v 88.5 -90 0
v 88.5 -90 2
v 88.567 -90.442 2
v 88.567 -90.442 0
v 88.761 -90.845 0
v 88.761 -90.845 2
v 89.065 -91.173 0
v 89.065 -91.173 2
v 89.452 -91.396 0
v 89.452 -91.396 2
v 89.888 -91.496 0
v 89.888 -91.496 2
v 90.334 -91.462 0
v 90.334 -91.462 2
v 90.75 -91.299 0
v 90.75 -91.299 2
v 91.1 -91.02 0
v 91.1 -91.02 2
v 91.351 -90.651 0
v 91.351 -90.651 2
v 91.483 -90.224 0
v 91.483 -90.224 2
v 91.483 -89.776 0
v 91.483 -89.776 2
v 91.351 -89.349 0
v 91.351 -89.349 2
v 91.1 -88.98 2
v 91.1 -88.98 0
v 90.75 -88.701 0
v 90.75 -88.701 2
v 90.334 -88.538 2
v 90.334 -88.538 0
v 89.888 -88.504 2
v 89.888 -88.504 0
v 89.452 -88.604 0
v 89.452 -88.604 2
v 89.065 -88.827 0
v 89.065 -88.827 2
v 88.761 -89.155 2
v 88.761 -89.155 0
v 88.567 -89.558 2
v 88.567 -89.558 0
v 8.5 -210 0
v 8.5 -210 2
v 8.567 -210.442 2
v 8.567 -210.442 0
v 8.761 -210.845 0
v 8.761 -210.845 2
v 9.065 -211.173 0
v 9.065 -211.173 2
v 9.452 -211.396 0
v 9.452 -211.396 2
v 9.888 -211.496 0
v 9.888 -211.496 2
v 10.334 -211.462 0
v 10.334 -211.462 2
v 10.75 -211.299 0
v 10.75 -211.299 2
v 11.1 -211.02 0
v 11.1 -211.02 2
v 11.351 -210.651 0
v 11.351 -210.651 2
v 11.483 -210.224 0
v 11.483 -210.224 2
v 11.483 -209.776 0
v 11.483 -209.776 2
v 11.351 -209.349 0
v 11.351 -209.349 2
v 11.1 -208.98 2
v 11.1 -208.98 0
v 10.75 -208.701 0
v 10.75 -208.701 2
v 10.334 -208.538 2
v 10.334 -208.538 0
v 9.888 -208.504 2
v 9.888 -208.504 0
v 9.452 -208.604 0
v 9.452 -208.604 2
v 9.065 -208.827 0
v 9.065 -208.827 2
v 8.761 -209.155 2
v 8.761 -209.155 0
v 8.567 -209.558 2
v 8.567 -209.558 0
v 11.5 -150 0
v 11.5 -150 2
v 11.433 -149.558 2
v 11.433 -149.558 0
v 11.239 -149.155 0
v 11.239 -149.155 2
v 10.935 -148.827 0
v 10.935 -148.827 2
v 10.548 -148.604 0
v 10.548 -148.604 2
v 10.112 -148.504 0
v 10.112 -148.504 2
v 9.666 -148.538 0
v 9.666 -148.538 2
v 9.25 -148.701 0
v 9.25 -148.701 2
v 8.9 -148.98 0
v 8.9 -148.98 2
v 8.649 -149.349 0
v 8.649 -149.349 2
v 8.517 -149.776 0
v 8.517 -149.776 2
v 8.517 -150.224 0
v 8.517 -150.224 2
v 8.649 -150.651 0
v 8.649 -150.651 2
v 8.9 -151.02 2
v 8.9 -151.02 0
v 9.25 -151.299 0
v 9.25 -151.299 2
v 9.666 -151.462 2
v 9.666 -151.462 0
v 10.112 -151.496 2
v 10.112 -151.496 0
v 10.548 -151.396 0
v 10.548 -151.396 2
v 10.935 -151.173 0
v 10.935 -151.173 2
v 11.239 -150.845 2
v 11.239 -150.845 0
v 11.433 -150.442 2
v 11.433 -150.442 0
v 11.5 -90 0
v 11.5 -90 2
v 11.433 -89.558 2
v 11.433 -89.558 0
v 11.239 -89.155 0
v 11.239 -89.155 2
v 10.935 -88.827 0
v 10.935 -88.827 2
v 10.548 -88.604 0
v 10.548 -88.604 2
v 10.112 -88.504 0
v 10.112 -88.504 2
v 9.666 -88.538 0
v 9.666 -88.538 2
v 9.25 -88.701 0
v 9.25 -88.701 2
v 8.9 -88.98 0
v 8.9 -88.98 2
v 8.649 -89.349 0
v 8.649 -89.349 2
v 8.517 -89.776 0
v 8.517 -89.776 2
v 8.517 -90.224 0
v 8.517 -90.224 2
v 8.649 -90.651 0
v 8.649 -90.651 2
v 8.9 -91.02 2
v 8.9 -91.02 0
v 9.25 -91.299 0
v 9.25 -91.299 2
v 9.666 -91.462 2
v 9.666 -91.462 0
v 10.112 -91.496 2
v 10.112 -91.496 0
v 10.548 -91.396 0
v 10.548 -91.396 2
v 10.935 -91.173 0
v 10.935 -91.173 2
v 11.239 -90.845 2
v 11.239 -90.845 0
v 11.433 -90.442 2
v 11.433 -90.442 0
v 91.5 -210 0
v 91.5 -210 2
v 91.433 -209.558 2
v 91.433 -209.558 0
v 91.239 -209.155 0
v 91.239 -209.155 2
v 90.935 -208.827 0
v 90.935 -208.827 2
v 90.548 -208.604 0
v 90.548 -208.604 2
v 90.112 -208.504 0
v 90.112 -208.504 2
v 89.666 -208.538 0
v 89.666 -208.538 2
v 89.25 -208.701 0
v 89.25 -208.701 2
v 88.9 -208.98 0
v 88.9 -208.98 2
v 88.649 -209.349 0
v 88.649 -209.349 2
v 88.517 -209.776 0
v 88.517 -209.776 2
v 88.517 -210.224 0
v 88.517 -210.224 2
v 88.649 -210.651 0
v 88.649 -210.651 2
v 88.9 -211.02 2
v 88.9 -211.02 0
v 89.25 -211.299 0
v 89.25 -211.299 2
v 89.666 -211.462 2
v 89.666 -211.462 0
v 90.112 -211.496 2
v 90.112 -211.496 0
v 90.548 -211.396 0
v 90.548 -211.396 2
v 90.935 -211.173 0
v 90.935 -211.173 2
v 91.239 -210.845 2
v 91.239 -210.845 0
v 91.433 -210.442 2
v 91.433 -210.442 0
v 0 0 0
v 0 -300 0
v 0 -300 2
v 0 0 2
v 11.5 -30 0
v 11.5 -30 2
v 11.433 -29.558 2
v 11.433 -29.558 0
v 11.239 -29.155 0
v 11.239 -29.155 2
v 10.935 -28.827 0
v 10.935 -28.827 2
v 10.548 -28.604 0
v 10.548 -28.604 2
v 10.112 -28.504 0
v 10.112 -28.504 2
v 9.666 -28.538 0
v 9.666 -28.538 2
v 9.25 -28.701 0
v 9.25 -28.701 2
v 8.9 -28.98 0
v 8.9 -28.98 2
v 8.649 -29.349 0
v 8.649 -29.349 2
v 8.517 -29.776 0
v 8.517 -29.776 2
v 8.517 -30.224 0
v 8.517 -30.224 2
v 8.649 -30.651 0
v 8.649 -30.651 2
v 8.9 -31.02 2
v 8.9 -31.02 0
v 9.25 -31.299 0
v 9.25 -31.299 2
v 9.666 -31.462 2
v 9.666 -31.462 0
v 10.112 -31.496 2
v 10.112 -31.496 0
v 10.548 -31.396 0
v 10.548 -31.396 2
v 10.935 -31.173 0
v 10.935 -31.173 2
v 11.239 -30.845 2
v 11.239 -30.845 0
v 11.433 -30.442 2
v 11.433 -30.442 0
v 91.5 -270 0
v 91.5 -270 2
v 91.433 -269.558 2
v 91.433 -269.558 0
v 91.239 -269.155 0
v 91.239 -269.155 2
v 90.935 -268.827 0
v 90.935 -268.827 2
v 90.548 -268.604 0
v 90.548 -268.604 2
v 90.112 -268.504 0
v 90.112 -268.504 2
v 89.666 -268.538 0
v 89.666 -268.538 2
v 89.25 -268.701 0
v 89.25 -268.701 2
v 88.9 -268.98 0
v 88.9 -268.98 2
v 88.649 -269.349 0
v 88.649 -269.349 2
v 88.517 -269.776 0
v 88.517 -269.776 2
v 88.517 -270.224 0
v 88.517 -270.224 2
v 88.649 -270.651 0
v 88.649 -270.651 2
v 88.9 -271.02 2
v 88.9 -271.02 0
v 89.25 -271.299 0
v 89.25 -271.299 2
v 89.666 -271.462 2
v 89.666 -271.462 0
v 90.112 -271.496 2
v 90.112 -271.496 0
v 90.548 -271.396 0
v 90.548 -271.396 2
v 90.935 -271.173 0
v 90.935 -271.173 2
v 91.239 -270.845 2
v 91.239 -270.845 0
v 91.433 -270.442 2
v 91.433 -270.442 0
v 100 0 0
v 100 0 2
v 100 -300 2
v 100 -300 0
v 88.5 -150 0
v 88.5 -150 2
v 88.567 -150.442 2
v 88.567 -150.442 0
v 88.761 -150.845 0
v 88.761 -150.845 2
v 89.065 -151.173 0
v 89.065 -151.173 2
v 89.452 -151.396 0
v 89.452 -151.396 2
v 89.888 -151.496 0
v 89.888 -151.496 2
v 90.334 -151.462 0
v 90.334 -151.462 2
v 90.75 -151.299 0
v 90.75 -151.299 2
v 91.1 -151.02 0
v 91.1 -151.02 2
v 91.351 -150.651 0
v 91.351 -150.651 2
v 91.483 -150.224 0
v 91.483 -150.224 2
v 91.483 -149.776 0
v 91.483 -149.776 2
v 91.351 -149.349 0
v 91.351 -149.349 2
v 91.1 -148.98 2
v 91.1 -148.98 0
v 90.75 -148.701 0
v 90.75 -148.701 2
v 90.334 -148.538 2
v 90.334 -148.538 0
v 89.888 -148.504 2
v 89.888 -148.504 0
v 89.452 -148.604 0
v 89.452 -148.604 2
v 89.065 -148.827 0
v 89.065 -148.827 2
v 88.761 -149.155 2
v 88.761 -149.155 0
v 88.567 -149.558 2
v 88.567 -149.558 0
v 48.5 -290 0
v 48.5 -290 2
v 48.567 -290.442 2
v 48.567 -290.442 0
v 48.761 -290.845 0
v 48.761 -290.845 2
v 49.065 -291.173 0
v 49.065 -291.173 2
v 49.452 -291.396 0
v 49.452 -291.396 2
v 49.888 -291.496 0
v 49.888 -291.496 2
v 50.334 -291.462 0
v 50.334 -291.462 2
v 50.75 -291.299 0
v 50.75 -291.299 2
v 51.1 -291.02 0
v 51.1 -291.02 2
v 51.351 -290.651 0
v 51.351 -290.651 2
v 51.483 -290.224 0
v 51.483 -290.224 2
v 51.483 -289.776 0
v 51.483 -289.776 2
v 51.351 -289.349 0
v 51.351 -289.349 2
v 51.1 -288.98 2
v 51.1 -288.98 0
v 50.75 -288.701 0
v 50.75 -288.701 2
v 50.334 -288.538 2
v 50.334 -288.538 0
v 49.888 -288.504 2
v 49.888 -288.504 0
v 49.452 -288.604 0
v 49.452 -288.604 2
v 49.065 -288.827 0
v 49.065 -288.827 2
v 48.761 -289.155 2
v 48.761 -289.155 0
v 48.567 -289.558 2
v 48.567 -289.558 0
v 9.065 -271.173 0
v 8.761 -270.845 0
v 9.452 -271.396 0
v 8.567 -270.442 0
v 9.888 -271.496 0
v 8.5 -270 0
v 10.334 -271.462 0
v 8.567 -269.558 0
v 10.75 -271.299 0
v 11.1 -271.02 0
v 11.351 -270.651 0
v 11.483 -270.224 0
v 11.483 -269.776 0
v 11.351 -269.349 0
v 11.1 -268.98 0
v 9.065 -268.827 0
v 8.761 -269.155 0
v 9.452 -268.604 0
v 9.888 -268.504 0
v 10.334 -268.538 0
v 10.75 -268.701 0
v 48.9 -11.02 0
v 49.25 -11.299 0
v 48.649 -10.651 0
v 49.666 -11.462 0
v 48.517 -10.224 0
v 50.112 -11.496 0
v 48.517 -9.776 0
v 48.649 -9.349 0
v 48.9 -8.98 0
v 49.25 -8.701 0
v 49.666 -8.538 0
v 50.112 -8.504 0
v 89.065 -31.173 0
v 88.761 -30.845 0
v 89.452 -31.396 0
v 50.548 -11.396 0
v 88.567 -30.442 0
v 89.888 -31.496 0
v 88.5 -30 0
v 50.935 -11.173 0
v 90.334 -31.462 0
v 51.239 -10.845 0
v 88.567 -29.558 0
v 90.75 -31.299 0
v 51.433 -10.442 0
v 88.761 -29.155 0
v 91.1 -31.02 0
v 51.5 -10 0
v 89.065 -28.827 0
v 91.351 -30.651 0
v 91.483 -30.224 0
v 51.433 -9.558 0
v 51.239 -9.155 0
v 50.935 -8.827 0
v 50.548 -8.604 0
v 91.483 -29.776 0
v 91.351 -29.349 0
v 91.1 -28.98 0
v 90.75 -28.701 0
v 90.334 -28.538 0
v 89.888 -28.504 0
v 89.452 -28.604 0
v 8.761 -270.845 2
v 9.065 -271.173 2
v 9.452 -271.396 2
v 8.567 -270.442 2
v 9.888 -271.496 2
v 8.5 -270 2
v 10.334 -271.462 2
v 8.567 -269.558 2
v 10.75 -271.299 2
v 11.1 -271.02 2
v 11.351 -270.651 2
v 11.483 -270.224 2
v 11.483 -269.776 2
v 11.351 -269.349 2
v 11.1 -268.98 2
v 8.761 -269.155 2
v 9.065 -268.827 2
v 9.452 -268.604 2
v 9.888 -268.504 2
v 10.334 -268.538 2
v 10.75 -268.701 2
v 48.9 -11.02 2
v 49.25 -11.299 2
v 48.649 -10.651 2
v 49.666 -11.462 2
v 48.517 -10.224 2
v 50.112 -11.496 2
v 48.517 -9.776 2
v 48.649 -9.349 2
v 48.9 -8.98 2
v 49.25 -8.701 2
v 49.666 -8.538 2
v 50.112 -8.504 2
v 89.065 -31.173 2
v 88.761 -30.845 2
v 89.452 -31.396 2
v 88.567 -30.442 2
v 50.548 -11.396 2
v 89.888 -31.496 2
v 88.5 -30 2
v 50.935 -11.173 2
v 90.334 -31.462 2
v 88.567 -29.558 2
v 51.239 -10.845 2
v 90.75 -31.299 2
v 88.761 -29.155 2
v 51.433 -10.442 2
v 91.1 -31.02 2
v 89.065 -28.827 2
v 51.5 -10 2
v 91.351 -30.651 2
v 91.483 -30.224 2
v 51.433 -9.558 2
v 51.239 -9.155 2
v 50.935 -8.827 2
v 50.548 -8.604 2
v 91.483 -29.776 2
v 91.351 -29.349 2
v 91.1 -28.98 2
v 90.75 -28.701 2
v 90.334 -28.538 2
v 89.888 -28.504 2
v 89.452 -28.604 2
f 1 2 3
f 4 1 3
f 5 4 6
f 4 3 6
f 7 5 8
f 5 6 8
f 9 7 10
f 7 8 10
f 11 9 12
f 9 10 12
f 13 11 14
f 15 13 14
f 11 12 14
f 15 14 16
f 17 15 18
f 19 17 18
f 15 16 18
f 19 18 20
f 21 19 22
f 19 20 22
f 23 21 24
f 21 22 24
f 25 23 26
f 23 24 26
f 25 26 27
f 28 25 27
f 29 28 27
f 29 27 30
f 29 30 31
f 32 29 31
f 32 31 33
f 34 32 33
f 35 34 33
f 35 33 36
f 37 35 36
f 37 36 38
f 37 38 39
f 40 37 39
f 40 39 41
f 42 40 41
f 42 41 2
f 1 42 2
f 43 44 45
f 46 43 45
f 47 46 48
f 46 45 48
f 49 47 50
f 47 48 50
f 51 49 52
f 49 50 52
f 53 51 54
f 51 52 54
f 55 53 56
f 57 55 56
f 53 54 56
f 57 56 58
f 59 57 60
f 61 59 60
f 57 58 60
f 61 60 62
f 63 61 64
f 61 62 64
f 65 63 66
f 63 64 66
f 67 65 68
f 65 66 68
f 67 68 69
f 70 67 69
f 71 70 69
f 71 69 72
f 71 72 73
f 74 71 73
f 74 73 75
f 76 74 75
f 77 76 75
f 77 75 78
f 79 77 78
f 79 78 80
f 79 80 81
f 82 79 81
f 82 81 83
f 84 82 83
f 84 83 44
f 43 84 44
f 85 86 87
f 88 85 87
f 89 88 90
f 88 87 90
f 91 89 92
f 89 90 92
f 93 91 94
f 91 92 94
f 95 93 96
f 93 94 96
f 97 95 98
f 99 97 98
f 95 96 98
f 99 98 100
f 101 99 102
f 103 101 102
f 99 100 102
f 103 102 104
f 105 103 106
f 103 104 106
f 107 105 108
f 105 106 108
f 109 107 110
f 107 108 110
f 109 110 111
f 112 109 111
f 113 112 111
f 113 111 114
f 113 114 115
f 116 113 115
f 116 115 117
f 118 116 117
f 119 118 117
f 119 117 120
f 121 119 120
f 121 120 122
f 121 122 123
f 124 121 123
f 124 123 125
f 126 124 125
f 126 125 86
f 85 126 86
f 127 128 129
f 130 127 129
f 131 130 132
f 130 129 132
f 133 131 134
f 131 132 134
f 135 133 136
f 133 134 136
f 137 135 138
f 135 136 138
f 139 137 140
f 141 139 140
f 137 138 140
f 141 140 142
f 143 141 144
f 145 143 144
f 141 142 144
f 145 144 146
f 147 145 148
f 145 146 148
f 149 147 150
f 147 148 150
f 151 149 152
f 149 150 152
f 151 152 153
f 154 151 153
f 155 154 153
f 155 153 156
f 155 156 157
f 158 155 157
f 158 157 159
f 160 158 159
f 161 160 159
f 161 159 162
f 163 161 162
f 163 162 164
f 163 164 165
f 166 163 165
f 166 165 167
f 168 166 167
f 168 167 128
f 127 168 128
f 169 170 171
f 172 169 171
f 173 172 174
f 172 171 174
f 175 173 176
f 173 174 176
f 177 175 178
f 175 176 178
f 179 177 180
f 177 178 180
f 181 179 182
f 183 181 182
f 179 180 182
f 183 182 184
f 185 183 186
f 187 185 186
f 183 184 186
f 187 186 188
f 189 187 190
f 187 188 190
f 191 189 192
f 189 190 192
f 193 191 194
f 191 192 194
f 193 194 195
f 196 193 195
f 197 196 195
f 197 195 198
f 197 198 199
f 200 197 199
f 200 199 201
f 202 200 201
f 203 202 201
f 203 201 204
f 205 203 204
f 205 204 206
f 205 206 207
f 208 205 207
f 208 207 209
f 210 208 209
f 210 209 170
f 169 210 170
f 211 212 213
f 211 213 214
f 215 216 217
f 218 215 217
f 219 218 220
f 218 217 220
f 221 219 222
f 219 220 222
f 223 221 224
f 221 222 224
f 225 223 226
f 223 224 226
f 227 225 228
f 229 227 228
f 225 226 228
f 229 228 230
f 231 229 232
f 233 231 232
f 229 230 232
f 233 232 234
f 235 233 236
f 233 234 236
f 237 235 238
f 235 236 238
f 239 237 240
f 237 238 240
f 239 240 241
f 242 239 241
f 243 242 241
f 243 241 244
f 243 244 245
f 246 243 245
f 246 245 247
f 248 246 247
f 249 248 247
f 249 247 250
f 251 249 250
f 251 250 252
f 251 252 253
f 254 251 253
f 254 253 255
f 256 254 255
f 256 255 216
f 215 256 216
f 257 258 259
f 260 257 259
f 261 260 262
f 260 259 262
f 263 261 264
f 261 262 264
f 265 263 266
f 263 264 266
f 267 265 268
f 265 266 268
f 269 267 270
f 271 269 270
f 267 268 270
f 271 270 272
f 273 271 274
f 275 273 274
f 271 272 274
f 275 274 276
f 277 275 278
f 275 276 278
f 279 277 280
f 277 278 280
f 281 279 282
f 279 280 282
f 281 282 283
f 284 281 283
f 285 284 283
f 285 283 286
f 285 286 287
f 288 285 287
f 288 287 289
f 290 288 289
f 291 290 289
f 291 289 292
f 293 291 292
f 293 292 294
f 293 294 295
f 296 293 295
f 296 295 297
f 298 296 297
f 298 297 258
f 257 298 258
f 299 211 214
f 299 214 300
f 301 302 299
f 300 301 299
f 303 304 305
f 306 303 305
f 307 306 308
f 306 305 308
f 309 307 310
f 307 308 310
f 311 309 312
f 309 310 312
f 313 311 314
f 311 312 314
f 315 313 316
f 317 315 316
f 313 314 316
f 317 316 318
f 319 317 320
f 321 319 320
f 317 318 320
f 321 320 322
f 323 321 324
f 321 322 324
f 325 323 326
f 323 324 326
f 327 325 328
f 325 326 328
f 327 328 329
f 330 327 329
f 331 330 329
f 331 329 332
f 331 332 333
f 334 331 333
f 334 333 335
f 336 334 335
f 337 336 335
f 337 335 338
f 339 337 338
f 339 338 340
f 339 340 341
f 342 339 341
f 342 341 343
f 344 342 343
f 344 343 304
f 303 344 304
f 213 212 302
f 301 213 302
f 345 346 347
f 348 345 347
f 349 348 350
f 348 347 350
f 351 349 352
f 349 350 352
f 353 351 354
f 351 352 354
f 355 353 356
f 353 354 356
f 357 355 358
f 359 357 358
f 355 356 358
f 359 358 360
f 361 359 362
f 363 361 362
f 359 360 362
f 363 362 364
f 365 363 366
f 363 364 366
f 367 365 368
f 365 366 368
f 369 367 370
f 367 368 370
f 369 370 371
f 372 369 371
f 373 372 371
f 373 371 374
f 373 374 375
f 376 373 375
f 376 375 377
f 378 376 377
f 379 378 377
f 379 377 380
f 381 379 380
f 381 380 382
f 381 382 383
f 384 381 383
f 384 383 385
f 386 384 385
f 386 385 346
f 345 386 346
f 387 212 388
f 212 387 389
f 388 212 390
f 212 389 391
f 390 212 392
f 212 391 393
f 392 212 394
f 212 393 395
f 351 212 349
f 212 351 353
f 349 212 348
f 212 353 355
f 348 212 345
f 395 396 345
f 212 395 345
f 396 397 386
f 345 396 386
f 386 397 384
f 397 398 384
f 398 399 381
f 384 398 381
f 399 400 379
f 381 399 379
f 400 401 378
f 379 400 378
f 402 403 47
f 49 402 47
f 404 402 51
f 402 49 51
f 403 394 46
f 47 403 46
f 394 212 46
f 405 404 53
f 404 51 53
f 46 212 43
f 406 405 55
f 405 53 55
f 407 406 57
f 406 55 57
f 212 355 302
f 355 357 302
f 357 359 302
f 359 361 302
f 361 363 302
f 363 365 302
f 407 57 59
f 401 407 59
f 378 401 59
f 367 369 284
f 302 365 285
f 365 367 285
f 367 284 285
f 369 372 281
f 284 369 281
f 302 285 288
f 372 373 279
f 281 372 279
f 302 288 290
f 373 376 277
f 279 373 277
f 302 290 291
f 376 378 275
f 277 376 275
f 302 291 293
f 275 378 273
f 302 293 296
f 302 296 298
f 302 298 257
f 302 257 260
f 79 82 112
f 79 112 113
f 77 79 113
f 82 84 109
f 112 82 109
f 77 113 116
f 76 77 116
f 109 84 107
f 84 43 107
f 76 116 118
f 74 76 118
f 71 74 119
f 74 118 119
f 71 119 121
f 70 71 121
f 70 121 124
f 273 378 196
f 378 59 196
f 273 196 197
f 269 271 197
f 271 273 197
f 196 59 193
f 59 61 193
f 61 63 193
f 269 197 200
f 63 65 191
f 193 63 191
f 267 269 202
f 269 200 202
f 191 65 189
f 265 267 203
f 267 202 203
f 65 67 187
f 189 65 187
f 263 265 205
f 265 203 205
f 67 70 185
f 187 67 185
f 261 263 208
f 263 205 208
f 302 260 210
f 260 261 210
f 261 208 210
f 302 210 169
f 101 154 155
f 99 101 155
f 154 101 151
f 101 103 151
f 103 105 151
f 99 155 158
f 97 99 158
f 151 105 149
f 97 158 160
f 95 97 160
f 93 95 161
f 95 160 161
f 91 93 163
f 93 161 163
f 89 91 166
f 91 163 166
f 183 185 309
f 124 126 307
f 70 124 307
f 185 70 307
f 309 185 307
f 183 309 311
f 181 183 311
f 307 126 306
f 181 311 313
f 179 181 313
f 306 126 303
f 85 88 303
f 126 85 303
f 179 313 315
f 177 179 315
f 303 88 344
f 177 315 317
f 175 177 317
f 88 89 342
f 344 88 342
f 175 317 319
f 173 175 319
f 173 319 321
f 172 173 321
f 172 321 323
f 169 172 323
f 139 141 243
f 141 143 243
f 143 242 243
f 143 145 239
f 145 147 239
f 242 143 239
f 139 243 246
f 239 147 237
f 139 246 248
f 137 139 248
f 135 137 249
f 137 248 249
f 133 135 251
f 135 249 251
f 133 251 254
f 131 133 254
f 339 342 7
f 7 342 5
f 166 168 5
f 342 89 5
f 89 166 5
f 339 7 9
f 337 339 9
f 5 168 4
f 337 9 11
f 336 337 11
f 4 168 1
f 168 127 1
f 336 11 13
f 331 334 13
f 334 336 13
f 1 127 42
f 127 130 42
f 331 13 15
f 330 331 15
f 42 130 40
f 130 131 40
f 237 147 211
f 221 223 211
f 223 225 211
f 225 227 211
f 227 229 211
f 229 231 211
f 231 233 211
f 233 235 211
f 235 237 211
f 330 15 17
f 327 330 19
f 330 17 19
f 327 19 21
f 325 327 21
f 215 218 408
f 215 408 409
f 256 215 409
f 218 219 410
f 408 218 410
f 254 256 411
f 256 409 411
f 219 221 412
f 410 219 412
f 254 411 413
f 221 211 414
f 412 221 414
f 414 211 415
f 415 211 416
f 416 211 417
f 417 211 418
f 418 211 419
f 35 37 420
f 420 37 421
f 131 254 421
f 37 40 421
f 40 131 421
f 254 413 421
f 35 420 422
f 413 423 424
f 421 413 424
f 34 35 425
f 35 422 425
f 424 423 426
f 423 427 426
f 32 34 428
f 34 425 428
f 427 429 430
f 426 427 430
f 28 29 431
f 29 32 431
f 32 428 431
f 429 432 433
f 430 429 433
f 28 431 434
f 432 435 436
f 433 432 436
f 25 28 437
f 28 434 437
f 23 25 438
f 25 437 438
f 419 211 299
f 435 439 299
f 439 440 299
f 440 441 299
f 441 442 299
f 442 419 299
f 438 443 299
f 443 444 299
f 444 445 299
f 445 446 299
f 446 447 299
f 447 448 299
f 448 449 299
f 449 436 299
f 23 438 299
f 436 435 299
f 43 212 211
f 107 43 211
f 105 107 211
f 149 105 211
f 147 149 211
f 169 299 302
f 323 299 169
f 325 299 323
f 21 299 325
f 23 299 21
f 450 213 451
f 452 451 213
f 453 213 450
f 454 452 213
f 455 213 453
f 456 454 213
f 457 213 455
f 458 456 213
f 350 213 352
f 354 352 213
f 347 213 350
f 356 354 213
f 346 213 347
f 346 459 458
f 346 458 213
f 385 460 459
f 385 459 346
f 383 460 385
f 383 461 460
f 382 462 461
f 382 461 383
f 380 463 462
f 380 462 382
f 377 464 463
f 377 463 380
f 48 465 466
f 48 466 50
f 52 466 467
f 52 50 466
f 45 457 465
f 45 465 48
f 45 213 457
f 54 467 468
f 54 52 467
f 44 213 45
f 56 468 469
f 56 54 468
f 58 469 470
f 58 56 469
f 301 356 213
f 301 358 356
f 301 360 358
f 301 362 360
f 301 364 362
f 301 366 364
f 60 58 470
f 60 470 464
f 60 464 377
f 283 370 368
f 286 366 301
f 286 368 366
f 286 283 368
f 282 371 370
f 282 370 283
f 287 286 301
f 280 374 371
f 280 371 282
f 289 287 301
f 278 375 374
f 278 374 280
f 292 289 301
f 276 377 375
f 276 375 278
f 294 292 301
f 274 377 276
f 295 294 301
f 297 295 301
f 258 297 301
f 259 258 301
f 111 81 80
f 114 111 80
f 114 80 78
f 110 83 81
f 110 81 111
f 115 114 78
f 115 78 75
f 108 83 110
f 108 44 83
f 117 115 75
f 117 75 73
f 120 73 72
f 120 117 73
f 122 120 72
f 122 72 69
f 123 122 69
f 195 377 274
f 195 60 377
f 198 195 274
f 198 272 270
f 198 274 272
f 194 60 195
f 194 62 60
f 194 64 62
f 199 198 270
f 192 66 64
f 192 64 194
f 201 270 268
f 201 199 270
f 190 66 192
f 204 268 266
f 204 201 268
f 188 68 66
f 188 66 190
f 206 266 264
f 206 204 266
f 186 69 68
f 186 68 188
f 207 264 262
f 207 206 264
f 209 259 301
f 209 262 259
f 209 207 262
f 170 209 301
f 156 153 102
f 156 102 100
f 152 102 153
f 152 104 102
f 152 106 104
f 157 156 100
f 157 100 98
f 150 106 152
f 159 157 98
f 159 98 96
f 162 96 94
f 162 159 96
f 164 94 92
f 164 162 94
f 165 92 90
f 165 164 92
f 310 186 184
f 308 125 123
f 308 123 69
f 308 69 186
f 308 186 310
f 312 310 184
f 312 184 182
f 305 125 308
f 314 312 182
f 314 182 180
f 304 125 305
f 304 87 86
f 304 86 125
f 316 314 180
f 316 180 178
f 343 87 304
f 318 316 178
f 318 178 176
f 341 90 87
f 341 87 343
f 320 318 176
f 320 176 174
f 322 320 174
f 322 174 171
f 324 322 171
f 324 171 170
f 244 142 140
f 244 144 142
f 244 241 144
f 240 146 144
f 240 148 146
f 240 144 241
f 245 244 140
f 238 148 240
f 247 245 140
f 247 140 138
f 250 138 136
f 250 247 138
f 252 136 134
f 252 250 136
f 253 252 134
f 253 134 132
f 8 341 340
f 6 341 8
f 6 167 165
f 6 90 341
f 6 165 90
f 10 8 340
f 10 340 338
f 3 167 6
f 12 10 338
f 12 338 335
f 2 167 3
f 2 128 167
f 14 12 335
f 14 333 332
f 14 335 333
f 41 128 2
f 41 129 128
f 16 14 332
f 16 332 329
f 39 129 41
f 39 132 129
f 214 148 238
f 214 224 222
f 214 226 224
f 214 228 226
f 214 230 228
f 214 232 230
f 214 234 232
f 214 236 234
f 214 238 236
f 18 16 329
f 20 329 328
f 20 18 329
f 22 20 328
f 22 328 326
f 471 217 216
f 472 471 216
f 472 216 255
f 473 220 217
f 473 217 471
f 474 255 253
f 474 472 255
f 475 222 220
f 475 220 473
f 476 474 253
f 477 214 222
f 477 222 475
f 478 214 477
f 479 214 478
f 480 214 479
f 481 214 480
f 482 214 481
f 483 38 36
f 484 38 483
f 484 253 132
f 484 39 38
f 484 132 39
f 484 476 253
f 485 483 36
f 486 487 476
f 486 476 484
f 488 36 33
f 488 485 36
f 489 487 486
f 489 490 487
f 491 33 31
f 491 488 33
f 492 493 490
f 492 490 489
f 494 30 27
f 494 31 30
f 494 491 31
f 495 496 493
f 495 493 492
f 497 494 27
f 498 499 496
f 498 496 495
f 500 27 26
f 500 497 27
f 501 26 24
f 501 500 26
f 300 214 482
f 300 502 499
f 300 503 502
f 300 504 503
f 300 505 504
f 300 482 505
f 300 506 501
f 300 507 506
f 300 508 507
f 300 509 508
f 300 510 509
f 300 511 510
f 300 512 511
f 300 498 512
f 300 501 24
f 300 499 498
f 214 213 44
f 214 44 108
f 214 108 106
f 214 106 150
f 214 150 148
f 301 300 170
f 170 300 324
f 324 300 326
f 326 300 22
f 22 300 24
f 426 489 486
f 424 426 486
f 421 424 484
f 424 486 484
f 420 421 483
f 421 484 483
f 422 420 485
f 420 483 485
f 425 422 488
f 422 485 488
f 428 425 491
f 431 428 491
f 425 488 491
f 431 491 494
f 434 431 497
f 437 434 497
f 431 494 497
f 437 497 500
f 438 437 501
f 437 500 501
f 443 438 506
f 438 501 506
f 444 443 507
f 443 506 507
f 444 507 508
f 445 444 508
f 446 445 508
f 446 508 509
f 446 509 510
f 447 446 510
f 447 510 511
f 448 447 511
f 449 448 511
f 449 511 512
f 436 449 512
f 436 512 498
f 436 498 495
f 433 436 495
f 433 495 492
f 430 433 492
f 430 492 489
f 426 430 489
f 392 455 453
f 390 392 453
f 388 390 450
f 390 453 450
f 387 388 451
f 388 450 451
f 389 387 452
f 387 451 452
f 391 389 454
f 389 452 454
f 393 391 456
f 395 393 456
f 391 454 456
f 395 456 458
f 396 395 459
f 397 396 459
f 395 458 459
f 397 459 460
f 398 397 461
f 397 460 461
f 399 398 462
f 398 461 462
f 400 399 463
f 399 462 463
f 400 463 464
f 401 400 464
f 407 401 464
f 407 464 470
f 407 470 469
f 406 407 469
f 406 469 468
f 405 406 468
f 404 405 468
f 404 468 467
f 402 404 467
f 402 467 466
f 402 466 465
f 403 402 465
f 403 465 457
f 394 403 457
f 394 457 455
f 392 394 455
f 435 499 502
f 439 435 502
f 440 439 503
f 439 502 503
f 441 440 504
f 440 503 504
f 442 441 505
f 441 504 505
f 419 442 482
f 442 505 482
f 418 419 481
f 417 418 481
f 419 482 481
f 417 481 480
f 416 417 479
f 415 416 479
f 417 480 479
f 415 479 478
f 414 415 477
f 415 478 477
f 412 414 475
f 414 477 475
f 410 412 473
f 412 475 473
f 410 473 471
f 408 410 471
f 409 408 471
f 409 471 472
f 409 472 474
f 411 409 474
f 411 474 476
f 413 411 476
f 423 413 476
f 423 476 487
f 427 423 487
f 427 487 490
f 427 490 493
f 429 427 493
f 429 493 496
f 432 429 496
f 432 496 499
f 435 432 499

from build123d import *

# Parameters (mm, degrees)
SKETCH1_W           = 100
SKETCH1_H           = 300
BOSS_EXTRUDE1_DEPTH = 2
SKETCH3_R           = 1.5
CUT_EXTRUDE1_DEPTH  = 317.234090509


with BuildPart() as part:
    # Sketch1 → Boss-Extrude1 (new body)
    with BuildSketch(Plane.XY):
        with Locations((50, -150)):
            Rectangle(SKETCH1_W, SKETCH1_H)
    extrude(amount=BOSS_EXTRUDE1_DEPTH)

    # Sketch3 → Cut-Extrude1 (cut, through all)
    with BuildSketch(Plane.XY.offset(2)):
        with Locations((10, -30)):
            Circle(SKETCH3_R)
        with Locations((10, -90)):
            Circle(SKETCH3_R)
        with Locations((10, -150)):
            Circle(SKETCH3_R)
        with Locations(Location((10, -210, 0), (0, 0, 180))):
            Circle(SKETCH3_R)
        with Locations(Location((10, -270, 0), (0, 0, 180))):
            Circle(SKETCH3_R)
        with Locations(Location((90, -150, 0), (0, 0, 180))):
            Circle(SKETCH3_R)
        with Locations(Location((90, -90, 0), (0, 0, 180))):
            Circle(SKETCH3_R)
        with Locations(Location((90, -30, 0), (0, 0, 180))):
            Circle(SKETCH3_R)
        with Locations((90, -270)):
            Circle(SKETCH3_R)
        with Locations((90, -210)):
            Circle(SKETCH3_R)
        with Locations((50, -10)):
            Circle(SKETCH3_R)
        with Locations(Location((50, -290, 0), (0, 0, 180))):
            Circle(SKETCH3_R)
    extrude(amount=-CUT_EXTRUDE1_DEPTH, mode=Mode.SUBTRACT)


solid = part.part
